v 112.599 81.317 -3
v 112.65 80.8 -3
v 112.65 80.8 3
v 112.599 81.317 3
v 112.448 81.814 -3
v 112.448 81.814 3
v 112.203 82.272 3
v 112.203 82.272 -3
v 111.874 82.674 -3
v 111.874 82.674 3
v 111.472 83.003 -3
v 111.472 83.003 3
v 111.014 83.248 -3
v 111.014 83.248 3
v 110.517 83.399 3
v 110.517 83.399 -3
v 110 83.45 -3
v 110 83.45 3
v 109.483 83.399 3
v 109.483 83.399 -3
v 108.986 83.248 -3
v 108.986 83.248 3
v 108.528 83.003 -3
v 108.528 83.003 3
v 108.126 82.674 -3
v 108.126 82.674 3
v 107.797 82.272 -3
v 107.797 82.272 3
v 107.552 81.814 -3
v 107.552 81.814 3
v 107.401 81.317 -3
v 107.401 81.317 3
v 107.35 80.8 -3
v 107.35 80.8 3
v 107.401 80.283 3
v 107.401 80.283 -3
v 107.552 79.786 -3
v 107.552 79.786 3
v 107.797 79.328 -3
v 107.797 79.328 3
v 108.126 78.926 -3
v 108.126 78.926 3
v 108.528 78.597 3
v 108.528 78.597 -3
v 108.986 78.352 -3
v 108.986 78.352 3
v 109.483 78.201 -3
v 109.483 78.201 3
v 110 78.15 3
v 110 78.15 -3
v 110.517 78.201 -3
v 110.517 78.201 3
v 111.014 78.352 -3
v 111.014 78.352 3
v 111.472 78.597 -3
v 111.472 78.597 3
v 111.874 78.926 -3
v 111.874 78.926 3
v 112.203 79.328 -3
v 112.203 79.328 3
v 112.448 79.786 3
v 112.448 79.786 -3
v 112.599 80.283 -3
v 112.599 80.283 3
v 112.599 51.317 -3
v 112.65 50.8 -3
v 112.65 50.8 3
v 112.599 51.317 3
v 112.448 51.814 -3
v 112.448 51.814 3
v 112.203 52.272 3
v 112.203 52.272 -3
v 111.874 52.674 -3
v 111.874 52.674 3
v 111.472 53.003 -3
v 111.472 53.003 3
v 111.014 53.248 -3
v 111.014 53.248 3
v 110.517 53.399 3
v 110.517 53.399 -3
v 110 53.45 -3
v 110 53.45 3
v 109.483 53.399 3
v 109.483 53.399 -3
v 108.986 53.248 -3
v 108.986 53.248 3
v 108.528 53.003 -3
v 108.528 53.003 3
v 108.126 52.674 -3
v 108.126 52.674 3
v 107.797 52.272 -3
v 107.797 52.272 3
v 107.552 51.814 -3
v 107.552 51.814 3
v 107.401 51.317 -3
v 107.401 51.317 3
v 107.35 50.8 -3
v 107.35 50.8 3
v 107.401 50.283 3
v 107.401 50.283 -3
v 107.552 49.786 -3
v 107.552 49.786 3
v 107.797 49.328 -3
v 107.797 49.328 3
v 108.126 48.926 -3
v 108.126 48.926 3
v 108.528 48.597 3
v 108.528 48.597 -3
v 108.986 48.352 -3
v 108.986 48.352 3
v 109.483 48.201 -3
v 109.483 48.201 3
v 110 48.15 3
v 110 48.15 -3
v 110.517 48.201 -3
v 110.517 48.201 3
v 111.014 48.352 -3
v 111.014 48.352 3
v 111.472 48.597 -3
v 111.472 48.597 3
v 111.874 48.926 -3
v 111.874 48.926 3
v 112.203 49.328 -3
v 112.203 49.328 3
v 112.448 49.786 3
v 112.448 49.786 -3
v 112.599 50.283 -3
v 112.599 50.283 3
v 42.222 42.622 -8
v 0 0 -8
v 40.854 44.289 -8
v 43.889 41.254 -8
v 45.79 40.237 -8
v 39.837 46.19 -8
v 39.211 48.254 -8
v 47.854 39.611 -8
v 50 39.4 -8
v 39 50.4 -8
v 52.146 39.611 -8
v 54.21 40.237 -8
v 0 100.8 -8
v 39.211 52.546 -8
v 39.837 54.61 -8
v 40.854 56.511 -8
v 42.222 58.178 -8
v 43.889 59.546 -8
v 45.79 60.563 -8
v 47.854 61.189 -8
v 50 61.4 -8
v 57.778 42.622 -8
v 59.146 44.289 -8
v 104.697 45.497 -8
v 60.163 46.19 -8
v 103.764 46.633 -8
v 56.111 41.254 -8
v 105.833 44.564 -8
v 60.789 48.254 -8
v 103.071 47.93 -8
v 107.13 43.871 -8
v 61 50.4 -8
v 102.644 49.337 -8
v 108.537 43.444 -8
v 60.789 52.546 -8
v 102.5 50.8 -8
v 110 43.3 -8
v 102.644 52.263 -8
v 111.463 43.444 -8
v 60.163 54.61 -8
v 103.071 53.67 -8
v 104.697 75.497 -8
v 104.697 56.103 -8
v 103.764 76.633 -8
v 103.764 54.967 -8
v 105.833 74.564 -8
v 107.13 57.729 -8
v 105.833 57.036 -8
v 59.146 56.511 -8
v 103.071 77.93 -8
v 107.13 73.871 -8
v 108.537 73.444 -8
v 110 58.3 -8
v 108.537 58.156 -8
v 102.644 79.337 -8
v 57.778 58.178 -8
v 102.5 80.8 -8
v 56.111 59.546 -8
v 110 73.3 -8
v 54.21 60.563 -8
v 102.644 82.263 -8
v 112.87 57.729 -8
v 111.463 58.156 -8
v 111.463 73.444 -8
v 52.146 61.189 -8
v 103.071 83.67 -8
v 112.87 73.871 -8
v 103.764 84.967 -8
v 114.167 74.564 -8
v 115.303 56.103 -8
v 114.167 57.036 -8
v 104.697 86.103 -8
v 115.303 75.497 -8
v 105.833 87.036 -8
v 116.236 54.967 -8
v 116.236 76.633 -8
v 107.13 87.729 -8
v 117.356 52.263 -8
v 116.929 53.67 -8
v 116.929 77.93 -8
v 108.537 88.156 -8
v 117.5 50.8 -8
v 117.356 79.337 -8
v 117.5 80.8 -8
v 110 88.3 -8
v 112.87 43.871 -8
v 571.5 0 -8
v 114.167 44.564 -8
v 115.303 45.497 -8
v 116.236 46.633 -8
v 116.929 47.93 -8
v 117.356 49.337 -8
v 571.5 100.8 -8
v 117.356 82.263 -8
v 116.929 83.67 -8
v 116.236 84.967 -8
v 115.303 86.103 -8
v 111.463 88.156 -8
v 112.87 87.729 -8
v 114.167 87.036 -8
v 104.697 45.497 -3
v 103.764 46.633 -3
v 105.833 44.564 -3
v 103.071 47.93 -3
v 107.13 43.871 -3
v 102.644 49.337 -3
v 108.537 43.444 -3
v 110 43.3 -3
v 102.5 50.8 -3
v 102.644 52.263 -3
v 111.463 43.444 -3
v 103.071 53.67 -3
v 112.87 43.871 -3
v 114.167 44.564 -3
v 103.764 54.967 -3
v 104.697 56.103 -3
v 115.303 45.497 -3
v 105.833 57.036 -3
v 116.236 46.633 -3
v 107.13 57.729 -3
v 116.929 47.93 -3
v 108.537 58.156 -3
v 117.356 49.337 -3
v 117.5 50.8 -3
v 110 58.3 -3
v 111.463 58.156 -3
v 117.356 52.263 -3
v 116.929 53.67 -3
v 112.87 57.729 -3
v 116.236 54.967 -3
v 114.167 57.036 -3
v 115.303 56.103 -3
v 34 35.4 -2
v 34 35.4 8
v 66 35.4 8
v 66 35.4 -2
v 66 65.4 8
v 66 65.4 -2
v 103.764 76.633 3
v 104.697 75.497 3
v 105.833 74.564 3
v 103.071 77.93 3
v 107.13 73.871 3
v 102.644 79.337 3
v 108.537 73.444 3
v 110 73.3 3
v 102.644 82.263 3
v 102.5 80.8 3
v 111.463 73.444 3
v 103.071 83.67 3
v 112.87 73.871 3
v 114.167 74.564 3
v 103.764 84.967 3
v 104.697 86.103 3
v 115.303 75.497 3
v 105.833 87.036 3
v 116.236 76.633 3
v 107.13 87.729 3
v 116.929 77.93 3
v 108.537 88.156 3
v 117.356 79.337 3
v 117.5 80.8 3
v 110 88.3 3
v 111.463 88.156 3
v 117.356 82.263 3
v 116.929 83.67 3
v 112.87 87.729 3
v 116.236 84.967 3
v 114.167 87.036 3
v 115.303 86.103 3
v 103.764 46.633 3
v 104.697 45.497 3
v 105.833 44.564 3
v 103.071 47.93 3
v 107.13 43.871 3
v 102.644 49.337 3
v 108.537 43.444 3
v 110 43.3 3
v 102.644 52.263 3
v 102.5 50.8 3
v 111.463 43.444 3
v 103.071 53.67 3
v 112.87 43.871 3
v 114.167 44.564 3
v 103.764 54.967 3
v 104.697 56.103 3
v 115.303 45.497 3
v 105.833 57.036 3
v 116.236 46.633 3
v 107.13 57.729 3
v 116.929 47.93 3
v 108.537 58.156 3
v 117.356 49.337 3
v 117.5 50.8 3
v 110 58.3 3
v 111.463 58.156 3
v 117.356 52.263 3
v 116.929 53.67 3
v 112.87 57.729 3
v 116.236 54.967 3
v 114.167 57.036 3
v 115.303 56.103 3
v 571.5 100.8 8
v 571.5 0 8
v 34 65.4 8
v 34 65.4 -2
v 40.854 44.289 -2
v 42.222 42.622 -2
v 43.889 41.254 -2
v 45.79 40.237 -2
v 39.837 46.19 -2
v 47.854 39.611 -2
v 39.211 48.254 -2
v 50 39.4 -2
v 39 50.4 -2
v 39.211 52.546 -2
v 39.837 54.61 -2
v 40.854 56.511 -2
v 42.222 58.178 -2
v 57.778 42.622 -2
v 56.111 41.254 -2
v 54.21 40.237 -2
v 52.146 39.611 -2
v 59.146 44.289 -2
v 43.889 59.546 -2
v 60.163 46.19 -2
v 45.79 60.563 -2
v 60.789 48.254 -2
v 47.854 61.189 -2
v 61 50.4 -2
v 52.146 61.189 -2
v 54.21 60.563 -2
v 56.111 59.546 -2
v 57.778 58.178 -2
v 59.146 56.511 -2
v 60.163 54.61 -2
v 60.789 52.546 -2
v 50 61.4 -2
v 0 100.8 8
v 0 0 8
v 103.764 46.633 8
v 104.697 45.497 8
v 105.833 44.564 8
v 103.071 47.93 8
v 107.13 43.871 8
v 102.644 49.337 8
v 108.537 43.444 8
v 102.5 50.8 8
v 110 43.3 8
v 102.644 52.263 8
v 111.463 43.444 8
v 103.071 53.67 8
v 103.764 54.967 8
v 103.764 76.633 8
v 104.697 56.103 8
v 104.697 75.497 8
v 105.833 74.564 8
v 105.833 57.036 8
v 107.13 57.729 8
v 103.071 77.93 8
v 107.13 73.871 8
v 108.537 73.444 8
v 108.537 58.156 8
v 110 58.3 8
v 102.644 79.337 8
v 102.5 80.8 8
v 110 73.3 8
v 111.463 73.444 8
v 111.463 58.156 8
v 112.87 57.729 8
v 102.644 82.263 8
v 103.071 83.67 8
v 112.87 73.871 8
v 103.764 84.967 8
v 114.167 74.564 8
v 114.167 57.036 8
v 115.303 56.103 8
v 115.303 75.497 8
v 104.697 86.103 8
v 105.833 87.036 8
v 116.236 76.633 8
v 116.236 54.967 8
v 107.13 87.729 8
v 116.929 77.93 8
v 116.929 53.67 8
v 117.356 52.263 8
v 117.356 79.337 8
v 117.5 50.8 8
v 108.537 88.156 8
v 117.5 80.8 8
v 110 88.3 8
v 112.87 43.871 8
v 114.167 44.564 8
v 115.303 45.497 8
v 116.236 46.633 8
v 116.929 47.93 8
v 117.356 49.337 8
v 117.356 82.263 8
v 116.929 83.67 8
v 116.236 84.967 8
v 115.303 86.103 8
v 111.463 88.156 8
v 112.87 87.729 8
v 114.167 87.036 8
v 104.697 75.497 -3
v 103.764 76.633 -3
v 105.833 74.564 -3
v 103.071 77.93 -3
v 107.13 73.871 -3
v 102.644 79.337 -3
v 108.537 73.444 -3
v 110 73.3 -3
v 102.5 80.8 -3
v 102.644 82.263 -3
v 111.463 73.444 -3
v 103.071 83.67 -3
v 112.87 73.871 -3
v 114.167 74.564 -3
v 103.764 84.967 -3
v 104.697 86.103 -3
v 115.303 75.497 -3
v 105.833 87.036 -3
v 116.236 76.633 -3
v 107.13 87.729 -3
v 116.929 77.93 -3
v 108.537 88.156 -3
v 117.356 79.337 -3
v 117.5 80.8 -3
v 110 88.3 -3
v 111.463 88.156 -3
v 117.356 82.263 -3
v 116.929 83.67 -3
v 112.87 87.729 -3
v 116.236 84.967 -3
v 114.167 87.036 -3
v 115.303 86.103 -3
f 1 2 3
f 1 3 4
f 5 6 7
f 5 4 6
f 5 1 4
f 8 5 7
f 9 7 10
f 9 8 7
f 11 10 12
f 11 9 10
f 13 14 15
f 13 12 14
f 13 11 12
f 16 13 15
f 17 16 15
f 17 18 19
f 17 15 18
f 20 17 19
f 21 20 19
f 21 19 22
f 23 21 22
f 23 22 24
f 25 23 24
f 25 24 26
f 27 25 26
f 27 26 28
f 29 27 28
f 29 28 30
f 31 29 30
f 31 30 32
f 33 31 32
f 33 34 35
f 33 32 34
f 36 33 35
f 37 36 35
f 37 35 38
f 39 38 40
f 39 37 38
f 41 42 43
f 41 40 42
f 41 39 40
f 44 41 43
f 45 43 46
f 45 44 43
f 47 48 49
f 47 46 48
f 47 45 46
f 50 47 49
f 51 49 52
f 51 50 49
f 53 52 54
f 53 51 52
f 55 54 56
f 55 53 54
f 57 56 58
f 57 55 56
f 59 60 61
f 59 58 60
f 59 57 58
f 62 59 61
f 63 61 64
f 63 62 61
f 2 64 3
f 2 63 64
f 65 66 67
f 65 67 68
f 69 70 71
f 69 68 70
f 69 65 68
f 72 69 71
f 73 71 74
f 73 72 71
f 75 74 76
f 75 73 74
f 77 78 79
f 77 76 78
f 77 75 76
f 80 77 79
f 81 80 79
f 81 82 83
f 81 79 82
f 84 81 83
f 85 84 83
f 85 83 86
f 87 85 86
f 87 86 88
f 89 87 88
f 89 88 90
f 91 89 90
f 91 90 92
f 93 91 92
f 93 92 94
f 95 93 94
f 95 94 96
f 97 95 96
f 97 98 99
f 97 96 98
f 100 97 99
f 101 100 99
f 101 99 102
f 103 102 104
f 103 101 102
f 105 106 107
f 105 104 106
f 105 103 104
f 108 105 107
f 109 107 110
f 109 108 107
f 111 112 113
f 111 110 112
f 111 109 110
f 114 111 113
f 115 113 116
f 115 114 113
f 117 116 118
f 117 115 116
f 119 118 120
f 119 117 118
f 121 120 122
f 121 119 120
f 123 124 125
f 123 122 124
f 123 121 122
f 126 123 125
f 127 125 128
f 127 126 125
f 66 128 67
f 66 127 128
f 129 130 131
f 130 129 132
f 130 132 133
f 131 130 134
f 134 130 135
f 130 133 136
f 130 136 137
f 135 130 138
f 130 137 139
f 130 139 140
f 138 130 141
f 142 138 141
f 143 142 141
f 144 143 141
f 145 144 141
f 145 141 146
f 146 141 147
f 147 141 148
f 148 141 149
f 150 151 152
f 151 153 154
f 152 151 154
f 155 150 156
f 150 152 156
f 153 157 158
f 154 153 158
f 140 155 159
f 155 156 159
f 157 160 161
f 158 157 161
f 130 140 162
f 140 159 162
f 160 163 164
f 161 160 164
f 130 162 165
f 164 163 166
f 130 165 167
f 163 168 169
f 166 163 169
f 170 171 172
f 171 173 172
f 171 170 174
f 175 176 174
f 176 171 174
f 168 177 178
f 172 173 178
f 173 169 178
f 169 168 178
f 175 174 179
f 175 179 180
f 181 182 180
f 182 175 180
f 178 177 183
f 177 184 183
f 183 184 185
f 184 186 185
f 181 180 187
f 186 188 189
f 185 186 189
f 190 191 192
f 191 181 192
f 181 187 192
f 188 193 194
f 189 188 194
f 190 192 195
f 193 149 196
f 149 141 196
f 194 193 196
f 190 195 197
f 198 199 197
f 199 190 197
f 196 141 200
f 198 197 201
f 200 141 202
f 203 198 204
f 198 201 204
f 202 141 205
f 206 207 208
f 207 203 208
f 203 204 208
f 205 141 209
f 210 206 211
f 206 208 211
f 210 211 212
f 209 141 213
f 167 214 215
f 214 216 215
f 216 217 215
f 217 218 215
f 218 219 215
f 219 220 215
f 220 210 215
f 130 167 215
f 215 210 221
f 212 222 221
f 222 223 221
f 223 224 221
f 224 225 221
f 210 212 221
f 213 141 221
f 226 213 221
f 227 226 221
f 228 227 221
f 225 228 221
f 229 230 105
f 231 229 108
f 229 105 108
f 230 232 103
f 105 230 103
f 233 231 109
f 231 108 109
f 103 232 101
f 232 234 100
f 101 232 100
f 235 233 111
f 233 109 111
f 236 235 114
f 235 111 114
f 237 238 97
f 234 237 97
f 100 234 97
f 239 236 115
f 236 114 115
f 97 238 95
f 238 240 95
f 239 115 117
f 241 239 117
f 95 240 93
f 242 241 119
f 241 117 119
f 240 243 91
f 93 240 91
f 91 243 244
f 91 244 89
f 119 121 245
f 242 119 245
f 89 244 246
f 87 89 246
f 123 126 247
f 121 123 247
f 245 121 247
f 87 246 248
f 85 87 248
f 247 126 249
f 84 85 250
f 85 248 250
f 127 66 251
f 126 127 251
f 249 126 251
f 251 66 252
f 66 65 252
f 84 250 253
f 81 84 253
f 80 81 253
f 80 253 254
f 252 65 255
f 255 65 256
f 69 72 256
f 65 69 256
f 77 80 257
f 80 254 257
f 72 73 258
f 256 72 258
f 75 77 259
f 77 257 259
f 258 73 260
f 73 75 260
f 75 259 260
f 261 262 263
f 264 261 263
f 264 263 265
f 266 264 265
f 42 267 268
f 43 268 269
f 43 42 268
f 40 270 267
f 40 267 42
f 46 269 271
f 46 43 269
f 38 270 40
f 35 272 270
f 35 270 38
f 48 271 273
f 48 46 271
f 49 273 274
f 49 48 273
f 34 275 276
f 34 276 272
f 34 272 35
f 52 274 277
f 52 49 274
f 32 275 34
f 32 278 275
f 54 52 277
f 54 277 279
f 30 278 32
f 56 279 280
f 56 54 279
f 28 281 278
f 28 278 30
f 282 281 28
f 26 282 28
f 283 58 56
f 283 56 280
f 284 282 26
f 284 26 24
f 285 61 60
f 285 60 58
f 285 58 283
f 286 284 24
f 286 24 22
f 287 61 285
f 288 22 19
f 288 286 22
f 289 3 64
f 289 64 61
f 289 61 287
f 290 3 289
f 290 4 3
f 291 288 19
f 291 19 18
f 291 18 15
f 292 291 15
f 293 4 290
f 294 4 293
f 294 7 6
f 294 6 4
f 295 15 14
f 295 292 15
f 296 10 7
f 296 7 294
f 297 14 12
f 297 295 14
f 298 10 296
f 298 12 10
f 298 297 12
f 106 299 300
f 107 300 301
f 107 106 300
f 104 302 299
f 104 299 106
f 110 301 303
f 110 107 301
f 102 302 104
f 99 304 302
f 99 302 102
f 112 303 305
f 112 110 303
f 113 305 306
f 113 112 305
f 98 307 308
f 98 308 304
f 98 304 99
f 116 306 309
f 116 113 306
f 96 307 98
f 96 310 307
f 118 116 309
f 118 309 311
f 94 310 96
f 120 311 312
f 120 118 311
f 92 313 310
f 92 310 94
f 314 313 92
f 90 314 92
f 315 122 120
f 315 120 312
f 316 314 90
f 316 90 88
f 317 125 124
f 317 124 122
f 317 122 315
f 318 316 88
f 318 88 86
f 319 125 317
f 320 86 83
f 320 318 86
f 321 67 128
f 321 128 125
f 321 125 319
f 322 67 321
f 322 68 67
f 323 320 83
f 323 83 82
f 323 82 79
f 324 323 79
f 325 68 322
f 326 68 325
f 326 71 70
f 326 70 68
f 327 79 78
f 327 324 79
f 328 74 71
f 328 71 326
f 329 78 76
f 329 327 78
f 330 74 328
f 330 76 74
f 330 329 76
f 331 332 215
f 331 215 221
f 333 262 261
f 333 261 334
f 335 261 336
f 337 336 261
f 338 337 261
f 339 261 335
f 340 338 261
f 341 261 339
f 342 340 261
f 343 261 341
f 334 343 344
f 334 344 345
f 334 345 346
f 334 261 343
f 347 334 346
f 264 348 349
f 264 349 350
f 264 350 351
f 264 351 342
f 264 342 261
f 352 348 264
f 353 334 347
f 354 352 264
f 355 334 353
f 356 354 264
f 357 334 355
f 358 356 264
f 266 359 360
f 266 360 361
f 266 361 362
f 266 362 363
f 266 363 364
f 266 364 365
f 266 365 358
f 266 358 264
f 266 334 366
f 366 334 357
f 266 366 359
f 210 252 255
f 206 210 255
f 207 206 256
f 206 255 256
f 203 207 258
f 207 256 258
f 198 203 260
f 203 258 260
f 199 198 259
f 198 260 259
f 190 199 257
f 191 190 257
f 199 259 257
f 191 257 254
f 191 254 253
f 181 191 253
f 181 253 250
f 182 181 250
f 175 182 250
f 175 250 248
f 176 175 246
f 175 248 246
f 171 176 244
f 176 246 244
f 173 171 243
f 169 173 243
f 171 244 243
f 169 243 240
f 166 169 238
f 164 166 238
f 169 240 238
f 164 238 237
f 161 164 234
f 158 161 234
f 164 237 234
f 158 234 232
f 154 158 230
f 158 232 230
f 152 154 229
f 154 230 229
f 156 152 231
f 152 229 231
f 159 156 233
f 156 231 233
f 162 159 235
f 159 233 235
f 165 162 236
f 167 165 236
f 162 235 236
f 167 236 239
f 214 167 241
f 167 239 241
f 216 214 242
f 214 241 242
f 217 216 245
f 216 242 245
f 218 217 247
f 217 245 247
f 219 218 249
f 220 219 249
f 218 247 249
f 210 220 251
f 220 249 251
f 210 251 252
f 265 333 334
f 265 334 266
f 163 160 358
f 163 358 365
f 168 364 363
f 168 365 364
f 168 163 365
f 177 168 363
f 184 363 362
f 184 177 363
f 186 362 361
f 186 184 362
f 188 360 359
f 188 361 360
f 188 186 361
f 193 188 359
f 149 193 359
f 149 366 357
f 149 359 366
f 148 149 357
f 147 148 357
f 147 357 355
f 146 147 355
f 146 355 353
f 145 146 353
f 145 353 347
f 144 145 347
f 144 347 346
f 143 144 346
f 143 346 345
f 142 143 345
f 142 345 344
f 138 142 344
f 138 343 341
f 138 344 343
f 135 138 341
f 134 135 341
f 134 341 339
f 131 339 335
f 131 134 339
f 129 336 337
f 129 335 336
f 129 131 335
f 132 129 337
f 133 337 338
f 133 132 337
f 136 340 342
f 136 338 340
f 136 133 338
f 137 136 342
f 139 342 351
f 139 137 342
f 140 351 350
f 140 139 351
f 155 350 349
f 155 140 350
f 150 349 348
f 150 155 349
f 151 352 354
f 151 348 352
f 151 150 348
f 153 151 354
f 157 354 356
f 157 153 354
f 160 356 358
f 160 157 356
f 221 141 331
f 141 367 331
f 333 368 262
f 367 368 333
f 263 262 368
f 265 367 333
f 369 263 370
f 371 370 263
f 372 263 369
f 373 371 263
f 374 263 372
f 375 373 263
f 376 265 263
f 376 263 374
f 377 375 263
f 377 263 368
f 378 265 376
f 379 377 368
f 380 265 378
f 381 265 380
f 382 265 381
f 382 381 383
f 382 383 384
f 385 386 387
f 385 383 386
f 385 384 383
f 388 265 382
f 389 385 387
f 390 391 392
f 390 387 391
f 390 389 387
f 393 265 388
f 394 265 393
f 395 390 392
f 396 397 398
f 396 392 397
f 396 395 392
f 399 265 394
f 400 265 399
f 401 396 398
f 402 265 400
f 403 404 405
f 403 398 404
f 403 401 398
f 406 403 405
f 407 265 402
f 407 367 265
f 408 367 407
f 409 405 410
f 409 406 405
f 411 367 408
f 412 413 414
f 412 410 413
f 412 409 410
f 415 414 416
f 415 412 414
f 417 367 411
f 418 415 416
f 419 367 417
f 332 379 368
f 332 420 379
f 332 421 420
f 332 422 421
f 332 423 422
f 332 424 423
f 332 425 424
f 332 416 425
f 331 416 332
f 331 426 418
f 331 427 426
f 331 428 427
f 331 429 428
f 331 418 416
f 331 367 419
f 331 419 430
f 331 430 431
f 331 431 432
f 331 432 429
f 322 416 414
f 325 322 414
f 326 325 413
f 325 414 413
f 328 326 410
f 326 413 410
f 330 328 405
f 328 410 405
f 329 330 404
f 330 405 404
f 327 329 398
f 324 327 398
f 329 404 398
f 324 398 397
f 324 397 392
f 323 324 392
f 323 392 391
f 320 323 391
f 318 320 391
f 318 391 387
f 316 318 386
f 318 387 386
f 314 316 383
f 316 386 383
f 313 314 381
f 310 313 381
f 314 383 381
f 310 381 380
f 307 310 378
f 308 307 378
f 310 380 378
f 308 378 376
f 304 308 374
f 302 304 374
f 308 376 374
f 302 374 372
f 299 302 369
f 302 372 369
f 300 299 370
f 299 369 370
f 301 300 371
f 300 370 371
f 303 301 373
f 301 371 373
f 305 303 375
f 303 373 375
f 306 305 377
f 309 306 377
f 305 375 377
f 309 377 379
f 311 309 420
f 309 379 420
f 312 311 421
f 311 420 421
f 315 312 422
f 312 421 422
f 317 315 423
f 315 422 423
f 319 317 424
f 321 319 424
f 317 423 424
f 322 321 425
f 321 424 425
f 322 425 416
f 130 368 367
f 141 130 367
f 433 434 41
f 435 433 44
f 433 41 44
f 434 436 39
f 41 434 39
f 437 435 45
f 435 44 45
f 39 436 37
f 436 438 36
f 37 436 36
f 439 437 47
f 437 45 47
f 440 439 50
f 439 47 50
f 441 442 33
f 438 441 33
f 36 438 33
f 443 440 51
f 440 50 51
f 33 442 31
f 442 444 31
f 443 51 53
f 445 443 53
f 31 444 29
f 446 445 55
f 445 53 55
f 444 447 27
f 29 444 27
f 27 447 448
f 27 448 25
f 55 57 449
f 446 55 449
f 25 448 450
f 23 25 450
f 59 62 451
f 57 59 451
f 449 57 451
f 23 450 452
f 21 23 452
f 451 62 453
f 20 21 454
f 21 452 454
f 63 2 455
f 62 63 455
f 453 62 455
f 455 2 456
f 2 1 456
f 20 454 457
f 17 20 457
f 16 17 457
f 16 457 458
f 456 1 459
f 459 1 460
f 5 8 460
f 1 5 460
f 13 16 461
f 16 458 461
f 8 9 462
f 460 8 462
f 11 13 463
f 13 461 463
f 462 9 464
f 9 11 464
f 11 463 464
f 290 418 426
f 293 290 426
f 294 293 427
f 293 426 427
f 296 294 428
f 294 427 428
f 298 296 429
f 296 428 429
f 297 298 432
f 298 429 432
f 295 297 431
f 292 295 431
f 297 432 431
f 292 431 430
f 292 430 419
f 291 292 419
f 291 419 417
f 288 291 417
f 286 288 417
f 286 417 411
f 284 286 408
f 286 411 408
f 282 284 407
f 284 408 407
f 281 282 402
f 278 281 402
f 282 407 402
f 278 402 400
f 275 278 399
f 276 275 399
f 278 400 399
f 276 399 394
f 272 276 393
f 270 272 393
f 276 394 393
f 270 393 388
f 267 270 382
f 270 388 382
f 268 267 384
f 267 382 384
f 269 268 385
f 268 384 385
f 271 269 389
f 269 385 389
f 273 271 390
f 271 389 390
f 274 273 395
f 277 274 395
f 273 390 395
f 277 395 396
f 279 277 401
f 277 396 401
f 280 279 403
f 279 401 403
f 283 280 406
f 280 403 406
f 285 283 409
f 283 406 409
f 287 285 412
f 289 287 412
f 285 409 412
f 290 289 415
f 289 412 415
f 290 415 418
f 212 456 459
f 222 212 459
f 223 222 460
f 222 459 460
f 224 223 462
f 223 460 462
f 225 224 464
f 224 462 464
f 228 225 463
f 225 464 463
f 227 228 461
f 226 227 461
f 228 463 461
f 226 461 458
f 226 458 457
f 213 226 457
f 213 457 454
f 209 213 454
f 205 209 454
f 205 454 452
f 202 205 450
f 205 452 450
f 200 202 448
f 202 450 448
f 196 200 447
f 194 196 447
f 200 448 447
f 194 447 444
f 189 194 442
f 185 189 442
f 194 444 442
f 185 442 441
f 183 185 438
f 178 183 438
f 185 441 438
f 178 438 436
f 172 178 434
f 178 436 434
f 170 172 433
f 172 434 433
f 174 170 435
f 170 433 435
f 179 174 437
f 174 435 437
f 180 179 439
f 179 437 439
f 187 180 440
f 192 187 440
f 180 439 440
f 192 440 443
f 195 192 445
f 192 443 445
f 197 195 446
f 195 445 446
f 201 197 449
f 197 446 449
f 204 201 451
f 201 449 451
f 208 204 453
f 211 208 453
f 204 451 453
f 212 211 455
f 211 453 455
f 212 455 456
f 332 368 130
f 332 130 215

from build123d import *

# Parameters (mm, degrees)
SKETCH1_W               = 571.5
SKETCH1_H               = 100.8
BOSS_EXTRUDE1_DEPTH     = 8
CUT_EXTRUDE1_DEPTH      = 581.541893406
CUT_EXTRUDE1_DEPTH_BACK = 581.541893406
SKETCH9_R               = 11
SKETCH9_R_2             = 2.65
SKETCH10_W              = 32
SKETCH10_H              = 30
CUT_EXTRUDE2_DEPTH      = 10
SKETCH11_R              = 7.5
CUT_EXTRUDE3_DEPTH      = 5
CUT_EXTRUDE4_START      = -11
SKETCH11_2_R            = 7.5
CUT_EXTRUDE4_DEPTH      = 5


with BuildPart() as part:
    # Sketch1 → Boss-Extrude1 (new, symmetric)
    with BuildSketch(Plane.XY):
        with Locations((285.75, 50.4)):
            Rectangle(SKETCH1_W, SKETCH1_H)
    extrude(amount=BOSS_EXTRUDE1_DEPTH, both=True)

    # Sketch9 → Cut-Extrude1 (cut, two sides: drawn at the far end of the back side and taken through both)
    with BuildSketch(Plane.XY.offset(8).offset(-CUT_EXTRUDE1_DEPTH_BACK)):
        with Locations((50, 50.4)):
            Circle(SKETCH9_R)
        with Locations((110, 80.8)):
            Circle(SKETCH9_R_2)
        with Locations((110, 50.8)):
            Circle(SKETCH9_R_2)
    extrude(amount=CUT_EXTRUDE1_DEPTH + CUT_EXTRUDE1_DEPTH_BACK, mode=Mode.SUBTRACT)

    # Sketch10 → Cut-Extrude2 (cut)
    with BuildSketch(Plane.XY.offset(8)):
        with Locations((50, 50.4)):
            Rectangle(SKETCH10_W, SKETCH10_H)
    extrude(amount=-CUT_EXTRUDE2_DEPTH, mode=Mode.SUBTRACT)

    # Sketch11 → Cut-Extrude3 (cut)
    with BuildSketch(Plane.XY.offset(8)):
        with Locations((110, 80.8)):
            Circle(SKETCH11_R)
        with Locations((110, 50.8)):
            Circle(SKETCH11_R)
    extrude(amount=-CUT_EXTRUDE3_DEPTH, mode=Mode.SUBTRACT)

    # Sketch11<2> → Cut-Extrude4 (cut)
    with BuildSketch(Plane.XY.offset(8).offset(CUT_EXTRUDE4_START)):
        with Locations((110, 80.8)):
            Circle(SKETCH11_2_R)
        with Locations((110, 50.8)):
            Circle(SKETCH11_2_R)
    extrude(amount=-CUT_EXTRUDE4_DEPTH, mode=Mode.SUBTRACT)


solid = part.part
